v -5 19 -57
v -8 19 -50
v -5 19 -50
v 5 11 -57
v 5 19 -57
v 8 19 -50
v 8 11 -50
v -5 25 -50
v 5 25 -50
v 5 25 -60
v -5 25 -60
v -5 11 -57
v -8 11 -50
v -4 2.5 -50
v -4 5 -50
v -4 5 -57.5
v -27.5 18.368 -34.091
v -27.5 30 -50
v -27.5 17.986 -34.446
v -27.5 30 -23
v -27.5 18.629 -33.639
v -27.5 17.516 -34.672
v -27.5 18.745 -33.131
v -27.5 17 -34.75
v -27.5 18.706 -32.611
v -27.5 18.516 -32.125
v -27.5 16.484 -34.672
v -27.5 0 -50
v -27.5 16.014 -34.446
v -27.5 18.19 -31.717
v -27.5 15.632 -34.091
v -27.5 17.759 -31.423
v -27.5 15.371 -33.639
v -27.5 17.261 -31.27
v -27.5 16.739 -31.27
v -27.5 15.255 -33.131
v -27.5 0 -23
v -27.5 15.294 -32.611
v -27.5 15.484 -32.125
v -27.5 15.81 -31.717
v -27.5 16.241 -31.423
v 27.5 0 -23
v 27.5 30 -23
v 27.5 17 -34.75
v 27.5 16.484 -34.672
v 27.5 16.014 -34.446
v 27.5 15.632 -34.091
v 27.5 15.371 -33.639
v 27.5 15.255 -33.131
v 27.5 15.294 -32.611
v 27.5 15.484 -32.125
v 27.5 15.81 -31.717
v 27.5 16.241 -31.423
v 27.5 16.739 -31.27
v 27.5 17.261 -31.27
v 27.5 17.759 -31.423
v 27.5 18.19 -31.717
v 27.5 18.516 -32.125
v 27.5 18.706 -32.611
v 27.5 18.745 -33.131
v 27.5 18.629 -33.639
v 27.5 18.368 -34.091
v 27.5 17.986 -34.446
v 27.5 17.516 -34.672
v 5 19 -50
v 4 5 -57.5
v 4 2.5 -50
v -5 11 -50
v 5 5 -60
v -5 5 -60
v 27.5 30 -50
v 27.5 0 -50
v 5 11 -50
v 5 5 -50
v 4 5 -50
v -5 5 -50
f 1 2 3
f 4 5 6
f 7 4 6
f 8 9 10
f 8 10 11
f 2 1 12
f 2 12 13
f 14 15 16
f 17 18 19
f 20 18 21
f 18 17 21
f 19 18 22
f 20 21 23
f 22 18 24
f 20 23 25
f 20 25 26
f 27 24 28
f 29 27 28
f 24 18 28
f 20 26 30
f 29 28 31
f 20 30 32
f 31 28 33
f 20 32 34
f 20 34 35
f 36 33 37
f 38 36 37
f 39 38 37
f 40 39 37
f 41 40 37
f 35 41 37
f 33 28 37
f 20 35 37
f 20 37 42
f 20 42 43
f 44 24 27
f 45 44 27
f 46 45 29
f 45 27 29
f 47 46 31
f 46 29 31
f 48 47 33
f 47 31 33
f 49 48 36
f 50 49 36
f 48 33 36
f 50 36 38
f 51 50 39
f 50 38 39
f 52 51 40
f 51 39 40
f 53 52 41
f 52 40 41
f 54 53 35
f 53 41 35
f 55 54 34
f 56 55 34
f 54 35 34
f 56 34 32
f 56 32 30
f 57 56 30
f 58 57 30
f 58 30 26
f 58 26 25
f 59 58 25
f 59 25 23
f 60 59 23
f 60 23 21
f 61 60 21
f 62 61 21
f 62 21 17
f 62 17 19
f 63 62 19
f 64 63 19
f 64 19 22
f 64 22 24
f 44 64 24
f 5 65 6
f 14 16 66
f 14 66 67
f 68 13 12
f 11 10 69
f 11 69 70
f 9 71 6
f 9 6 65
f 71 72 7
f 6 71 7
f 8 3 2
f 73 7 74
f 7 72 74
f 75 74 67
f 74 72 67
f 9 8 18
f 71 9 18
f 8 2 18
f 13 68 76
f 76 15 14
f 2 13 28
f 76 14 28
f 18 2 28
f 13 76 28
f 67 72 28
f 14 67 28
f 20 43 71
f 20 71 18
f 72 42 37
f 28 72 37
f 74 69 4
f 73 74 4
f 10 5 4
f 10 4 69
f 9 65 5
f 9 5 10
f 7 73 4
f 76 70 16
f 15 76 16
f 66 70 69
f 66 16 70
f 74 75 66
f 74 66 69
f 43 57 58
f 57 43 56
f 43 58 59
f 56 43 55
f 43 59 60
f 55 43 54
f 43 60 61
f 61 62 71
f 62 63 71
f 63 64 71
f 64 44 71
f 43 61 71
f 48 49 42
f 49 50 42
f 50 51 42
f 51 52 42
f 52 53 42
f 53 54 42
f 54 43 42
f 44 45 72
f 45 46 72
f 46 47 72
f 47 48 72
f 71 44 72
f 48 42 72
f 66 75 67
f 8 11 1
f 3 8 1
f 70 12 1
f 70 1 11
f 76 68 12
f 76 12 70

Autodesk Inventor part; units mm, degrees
ref_plane "YZ Plane" through (0, 0, 0) normal (1, 0, 0) x (0, 1, 0)
sketch "Boceto1" plane through (0, 0, 0) normal (0, 1, 0) x (-1, 0, 0)
  line L0 (27.5, 50) -> (-27.5, 50)
  line L1 (-27.5, 50) -> (-27.5, -50)
  line L2 (-27.5, -50) -> (27.5, -50)
  line L3 (27.5, -50) -> (27.5, 50)
  line L4 (27.5, 50) -> (-27.5, -50) construction
  line L5 (-27.5, 50) -> (27.5, -50) construction
  point P0 (0, 0)
  dimension "d0" = 55
  dimension "d1" = 100
extrude "Extrusión1" add sketch "Boceto1" along normal blind 30
sketch "Boceto2" plane through (27.5, 0, -50) normal (0, 0, -1) x (-1, 0, 0)
  line L0 (22.5, 25) -> (32.5, 25)
  line L1 (32.5, 25) -> (32.5, 5)
  line L2 (32.5, 5) -> (22.5, 5)
  line L3 (22.5, 5) -> (22.5, 25)
  line L4 (22.5, 25) -> (32.5, 5) construction
  line L5 (32.5, 25) -> (22.5, 5) construction
  line L6 (0, 30) -> (55, 30) projected
  line L7 (0, 0) -> (0, 30) projected
  line L8 (55, 0) -> (55, 30) projected
  point P0 (27.5, 0)
  point P1 (27.5, 15)
  point P2 (27.5, 25)
  dimension "d4" = 10
  dimension "d5" = 20
  dimension "d6" = 5
  dimension "d7" = 22.5
  dimension "d24" = 22.5
extrude "Extrusión2" add sketch "Boceto2" along normal blind 10
sketch "Boceto3" plane through (-27.5, 0, 50) normal (0, 0, 1) x (1, 0, 0)
  circle A0 centre (27.5, 20) radius 5
  line L0 (0, 30) -> (55, 30) projected
  point P0 (27.5, 0)
  point P1 (27.5, 30)
  dimension "d10" = 10
  dimension "d11" = 10
extrude "Extrusión3" cut sketch "Boceto3" against normal blind 15
sketch "Boceto4" plane through (0, 30, 0) normal (0, 1, 0) x (1, 0, 0)
  line L0 (-20, 23) -> (20, 23)
  line L1 (20, 23) -> (20, -23)
  line L2 (20, -23) -> (-20, -23)
  line L3 (-20, -23) -> (-20, 23)
  line L4 (-20, 23) -> (20, -23) construction
  line L5 (20, 23) -> (-20, -23) construction
  point P0 (0, 0)
  dimension "d14" = 40
  dimension "d15" = 46
extrude "Extrusión4" cut sketch "Boceto4" against normal blind 20
ref_plane "Plano de trabajo1" through (0, 5, -50) normal (1, 0, 0) x (0, 0, -1)
sketch "Boceto5" plane through (0, 5, -50) normal (1, 0, 0) x (0, 0, -1)
  line L0 (7.5, 0) -> (0, -2.5)
  line L1 (0, -2.5) -> (0, 0)
  line L2 (0, 0) -> (7.5, 0)
  point P0 (-50, -5)
  point P1 (0, -5)
  point P2 (10, 0)
  dimension "d25" = 2.5
  dimension "d26" = 2.5
extrude "Extrusión5" add sketch "Boceto5" along normal mid plane 8
ref_plane "Plano de trabajo2" through (0, 15, 0) normal (0, -1, 0) x (1, 0, 0)
sketch "Boceto6" plane through (0, 15, 0) normal (0, -1, 0) x (1, 0, 0)
  line L0 (5, -50) -> (8, -50)
  line L1 (27.5, -50) -> (-27.5, -50)
  line L2 (5, -57) -> (8, -50)
  line L3 (4, -50) -> (5, -50) projected
  line L4 (5, -50) -> (5, -57)
  line L5 (0, -50.2371) -> (0, -56.5746)
  line L6 (-5, -50) -> (-8, -50)
  line L7 (-27.5, -50) -> (27.5, -50)
  line L8 (-5, -57) -> (-8, -50)
  line L9 (-4, -50) -> (-5, -50)
  line L10 (-5, -50) -> (-5, -57)
  point P0 (0, 0)
  point P1 (5, -60)
  point P2 (-5, -60)
  dimension "d29" = 3
  dimension "d30" = 3
extrude "Extrusión6" add sketch "Boceto6" along normal mid plane 8
sketch "Boceto7" plane through (27.5, 0, 50) normal (1, 0, 0) x (0, 0, -1)
  point P0 (50, 0)
ref_plane "Plano de trabajo4" through (-20, 30, -23) normal (0, 0, 1) x (1, 0, 0)
sketch "Boceto8" plane through (27.5, 0, 50) normal (1, 0, 0) x (0, 0, -1)
  line L0 (58, 22) -> (88, 22)
  circle A0 centre (83, 17) radius 1.75
  line L1 (63, 17) -> (83, 17)
  line L2 (88, 22) -> (88, 12)
  circle A1 centre (63, 17) radius 1.75
  line L3 (58, 12) -> (88, 22) construction
  line L4 (58, 22) -> (88, 12) construction
  line L5 (58, 12) -> (58, 22)
  line L6 (88, 12) -> (58, 12)
  line L7 (73, 30) -> (73, 10) projected
  line L8 (0, 30) -> (100, 30) projected
  point P0 (50, 0)
  point P1 (72.9522, 12.5553)
  point P2 (57.9522, 14.5161)
  point P3 (72.9522, 12.5553)
  point P4 (88, 17)
  dimension "d34" = 10
  dimension "d35" = 30
  dimension "d36" = 5
  dimension "d37" = 5
  dimension "d38" = 5
  dimension "d39" = 5
  dimension "d40" = 10
  dimension "d41" = 8
hole "Agujero1" at (27.5, 17, -13) at (27.5, 17, -33) direction (-1, 0, 0) diameter 3.5 end through all
split "Dividir1" plane through (-20, 30, -23) removes the side toward (0, 0, 1)
properties part number "camera_support_2_1"
